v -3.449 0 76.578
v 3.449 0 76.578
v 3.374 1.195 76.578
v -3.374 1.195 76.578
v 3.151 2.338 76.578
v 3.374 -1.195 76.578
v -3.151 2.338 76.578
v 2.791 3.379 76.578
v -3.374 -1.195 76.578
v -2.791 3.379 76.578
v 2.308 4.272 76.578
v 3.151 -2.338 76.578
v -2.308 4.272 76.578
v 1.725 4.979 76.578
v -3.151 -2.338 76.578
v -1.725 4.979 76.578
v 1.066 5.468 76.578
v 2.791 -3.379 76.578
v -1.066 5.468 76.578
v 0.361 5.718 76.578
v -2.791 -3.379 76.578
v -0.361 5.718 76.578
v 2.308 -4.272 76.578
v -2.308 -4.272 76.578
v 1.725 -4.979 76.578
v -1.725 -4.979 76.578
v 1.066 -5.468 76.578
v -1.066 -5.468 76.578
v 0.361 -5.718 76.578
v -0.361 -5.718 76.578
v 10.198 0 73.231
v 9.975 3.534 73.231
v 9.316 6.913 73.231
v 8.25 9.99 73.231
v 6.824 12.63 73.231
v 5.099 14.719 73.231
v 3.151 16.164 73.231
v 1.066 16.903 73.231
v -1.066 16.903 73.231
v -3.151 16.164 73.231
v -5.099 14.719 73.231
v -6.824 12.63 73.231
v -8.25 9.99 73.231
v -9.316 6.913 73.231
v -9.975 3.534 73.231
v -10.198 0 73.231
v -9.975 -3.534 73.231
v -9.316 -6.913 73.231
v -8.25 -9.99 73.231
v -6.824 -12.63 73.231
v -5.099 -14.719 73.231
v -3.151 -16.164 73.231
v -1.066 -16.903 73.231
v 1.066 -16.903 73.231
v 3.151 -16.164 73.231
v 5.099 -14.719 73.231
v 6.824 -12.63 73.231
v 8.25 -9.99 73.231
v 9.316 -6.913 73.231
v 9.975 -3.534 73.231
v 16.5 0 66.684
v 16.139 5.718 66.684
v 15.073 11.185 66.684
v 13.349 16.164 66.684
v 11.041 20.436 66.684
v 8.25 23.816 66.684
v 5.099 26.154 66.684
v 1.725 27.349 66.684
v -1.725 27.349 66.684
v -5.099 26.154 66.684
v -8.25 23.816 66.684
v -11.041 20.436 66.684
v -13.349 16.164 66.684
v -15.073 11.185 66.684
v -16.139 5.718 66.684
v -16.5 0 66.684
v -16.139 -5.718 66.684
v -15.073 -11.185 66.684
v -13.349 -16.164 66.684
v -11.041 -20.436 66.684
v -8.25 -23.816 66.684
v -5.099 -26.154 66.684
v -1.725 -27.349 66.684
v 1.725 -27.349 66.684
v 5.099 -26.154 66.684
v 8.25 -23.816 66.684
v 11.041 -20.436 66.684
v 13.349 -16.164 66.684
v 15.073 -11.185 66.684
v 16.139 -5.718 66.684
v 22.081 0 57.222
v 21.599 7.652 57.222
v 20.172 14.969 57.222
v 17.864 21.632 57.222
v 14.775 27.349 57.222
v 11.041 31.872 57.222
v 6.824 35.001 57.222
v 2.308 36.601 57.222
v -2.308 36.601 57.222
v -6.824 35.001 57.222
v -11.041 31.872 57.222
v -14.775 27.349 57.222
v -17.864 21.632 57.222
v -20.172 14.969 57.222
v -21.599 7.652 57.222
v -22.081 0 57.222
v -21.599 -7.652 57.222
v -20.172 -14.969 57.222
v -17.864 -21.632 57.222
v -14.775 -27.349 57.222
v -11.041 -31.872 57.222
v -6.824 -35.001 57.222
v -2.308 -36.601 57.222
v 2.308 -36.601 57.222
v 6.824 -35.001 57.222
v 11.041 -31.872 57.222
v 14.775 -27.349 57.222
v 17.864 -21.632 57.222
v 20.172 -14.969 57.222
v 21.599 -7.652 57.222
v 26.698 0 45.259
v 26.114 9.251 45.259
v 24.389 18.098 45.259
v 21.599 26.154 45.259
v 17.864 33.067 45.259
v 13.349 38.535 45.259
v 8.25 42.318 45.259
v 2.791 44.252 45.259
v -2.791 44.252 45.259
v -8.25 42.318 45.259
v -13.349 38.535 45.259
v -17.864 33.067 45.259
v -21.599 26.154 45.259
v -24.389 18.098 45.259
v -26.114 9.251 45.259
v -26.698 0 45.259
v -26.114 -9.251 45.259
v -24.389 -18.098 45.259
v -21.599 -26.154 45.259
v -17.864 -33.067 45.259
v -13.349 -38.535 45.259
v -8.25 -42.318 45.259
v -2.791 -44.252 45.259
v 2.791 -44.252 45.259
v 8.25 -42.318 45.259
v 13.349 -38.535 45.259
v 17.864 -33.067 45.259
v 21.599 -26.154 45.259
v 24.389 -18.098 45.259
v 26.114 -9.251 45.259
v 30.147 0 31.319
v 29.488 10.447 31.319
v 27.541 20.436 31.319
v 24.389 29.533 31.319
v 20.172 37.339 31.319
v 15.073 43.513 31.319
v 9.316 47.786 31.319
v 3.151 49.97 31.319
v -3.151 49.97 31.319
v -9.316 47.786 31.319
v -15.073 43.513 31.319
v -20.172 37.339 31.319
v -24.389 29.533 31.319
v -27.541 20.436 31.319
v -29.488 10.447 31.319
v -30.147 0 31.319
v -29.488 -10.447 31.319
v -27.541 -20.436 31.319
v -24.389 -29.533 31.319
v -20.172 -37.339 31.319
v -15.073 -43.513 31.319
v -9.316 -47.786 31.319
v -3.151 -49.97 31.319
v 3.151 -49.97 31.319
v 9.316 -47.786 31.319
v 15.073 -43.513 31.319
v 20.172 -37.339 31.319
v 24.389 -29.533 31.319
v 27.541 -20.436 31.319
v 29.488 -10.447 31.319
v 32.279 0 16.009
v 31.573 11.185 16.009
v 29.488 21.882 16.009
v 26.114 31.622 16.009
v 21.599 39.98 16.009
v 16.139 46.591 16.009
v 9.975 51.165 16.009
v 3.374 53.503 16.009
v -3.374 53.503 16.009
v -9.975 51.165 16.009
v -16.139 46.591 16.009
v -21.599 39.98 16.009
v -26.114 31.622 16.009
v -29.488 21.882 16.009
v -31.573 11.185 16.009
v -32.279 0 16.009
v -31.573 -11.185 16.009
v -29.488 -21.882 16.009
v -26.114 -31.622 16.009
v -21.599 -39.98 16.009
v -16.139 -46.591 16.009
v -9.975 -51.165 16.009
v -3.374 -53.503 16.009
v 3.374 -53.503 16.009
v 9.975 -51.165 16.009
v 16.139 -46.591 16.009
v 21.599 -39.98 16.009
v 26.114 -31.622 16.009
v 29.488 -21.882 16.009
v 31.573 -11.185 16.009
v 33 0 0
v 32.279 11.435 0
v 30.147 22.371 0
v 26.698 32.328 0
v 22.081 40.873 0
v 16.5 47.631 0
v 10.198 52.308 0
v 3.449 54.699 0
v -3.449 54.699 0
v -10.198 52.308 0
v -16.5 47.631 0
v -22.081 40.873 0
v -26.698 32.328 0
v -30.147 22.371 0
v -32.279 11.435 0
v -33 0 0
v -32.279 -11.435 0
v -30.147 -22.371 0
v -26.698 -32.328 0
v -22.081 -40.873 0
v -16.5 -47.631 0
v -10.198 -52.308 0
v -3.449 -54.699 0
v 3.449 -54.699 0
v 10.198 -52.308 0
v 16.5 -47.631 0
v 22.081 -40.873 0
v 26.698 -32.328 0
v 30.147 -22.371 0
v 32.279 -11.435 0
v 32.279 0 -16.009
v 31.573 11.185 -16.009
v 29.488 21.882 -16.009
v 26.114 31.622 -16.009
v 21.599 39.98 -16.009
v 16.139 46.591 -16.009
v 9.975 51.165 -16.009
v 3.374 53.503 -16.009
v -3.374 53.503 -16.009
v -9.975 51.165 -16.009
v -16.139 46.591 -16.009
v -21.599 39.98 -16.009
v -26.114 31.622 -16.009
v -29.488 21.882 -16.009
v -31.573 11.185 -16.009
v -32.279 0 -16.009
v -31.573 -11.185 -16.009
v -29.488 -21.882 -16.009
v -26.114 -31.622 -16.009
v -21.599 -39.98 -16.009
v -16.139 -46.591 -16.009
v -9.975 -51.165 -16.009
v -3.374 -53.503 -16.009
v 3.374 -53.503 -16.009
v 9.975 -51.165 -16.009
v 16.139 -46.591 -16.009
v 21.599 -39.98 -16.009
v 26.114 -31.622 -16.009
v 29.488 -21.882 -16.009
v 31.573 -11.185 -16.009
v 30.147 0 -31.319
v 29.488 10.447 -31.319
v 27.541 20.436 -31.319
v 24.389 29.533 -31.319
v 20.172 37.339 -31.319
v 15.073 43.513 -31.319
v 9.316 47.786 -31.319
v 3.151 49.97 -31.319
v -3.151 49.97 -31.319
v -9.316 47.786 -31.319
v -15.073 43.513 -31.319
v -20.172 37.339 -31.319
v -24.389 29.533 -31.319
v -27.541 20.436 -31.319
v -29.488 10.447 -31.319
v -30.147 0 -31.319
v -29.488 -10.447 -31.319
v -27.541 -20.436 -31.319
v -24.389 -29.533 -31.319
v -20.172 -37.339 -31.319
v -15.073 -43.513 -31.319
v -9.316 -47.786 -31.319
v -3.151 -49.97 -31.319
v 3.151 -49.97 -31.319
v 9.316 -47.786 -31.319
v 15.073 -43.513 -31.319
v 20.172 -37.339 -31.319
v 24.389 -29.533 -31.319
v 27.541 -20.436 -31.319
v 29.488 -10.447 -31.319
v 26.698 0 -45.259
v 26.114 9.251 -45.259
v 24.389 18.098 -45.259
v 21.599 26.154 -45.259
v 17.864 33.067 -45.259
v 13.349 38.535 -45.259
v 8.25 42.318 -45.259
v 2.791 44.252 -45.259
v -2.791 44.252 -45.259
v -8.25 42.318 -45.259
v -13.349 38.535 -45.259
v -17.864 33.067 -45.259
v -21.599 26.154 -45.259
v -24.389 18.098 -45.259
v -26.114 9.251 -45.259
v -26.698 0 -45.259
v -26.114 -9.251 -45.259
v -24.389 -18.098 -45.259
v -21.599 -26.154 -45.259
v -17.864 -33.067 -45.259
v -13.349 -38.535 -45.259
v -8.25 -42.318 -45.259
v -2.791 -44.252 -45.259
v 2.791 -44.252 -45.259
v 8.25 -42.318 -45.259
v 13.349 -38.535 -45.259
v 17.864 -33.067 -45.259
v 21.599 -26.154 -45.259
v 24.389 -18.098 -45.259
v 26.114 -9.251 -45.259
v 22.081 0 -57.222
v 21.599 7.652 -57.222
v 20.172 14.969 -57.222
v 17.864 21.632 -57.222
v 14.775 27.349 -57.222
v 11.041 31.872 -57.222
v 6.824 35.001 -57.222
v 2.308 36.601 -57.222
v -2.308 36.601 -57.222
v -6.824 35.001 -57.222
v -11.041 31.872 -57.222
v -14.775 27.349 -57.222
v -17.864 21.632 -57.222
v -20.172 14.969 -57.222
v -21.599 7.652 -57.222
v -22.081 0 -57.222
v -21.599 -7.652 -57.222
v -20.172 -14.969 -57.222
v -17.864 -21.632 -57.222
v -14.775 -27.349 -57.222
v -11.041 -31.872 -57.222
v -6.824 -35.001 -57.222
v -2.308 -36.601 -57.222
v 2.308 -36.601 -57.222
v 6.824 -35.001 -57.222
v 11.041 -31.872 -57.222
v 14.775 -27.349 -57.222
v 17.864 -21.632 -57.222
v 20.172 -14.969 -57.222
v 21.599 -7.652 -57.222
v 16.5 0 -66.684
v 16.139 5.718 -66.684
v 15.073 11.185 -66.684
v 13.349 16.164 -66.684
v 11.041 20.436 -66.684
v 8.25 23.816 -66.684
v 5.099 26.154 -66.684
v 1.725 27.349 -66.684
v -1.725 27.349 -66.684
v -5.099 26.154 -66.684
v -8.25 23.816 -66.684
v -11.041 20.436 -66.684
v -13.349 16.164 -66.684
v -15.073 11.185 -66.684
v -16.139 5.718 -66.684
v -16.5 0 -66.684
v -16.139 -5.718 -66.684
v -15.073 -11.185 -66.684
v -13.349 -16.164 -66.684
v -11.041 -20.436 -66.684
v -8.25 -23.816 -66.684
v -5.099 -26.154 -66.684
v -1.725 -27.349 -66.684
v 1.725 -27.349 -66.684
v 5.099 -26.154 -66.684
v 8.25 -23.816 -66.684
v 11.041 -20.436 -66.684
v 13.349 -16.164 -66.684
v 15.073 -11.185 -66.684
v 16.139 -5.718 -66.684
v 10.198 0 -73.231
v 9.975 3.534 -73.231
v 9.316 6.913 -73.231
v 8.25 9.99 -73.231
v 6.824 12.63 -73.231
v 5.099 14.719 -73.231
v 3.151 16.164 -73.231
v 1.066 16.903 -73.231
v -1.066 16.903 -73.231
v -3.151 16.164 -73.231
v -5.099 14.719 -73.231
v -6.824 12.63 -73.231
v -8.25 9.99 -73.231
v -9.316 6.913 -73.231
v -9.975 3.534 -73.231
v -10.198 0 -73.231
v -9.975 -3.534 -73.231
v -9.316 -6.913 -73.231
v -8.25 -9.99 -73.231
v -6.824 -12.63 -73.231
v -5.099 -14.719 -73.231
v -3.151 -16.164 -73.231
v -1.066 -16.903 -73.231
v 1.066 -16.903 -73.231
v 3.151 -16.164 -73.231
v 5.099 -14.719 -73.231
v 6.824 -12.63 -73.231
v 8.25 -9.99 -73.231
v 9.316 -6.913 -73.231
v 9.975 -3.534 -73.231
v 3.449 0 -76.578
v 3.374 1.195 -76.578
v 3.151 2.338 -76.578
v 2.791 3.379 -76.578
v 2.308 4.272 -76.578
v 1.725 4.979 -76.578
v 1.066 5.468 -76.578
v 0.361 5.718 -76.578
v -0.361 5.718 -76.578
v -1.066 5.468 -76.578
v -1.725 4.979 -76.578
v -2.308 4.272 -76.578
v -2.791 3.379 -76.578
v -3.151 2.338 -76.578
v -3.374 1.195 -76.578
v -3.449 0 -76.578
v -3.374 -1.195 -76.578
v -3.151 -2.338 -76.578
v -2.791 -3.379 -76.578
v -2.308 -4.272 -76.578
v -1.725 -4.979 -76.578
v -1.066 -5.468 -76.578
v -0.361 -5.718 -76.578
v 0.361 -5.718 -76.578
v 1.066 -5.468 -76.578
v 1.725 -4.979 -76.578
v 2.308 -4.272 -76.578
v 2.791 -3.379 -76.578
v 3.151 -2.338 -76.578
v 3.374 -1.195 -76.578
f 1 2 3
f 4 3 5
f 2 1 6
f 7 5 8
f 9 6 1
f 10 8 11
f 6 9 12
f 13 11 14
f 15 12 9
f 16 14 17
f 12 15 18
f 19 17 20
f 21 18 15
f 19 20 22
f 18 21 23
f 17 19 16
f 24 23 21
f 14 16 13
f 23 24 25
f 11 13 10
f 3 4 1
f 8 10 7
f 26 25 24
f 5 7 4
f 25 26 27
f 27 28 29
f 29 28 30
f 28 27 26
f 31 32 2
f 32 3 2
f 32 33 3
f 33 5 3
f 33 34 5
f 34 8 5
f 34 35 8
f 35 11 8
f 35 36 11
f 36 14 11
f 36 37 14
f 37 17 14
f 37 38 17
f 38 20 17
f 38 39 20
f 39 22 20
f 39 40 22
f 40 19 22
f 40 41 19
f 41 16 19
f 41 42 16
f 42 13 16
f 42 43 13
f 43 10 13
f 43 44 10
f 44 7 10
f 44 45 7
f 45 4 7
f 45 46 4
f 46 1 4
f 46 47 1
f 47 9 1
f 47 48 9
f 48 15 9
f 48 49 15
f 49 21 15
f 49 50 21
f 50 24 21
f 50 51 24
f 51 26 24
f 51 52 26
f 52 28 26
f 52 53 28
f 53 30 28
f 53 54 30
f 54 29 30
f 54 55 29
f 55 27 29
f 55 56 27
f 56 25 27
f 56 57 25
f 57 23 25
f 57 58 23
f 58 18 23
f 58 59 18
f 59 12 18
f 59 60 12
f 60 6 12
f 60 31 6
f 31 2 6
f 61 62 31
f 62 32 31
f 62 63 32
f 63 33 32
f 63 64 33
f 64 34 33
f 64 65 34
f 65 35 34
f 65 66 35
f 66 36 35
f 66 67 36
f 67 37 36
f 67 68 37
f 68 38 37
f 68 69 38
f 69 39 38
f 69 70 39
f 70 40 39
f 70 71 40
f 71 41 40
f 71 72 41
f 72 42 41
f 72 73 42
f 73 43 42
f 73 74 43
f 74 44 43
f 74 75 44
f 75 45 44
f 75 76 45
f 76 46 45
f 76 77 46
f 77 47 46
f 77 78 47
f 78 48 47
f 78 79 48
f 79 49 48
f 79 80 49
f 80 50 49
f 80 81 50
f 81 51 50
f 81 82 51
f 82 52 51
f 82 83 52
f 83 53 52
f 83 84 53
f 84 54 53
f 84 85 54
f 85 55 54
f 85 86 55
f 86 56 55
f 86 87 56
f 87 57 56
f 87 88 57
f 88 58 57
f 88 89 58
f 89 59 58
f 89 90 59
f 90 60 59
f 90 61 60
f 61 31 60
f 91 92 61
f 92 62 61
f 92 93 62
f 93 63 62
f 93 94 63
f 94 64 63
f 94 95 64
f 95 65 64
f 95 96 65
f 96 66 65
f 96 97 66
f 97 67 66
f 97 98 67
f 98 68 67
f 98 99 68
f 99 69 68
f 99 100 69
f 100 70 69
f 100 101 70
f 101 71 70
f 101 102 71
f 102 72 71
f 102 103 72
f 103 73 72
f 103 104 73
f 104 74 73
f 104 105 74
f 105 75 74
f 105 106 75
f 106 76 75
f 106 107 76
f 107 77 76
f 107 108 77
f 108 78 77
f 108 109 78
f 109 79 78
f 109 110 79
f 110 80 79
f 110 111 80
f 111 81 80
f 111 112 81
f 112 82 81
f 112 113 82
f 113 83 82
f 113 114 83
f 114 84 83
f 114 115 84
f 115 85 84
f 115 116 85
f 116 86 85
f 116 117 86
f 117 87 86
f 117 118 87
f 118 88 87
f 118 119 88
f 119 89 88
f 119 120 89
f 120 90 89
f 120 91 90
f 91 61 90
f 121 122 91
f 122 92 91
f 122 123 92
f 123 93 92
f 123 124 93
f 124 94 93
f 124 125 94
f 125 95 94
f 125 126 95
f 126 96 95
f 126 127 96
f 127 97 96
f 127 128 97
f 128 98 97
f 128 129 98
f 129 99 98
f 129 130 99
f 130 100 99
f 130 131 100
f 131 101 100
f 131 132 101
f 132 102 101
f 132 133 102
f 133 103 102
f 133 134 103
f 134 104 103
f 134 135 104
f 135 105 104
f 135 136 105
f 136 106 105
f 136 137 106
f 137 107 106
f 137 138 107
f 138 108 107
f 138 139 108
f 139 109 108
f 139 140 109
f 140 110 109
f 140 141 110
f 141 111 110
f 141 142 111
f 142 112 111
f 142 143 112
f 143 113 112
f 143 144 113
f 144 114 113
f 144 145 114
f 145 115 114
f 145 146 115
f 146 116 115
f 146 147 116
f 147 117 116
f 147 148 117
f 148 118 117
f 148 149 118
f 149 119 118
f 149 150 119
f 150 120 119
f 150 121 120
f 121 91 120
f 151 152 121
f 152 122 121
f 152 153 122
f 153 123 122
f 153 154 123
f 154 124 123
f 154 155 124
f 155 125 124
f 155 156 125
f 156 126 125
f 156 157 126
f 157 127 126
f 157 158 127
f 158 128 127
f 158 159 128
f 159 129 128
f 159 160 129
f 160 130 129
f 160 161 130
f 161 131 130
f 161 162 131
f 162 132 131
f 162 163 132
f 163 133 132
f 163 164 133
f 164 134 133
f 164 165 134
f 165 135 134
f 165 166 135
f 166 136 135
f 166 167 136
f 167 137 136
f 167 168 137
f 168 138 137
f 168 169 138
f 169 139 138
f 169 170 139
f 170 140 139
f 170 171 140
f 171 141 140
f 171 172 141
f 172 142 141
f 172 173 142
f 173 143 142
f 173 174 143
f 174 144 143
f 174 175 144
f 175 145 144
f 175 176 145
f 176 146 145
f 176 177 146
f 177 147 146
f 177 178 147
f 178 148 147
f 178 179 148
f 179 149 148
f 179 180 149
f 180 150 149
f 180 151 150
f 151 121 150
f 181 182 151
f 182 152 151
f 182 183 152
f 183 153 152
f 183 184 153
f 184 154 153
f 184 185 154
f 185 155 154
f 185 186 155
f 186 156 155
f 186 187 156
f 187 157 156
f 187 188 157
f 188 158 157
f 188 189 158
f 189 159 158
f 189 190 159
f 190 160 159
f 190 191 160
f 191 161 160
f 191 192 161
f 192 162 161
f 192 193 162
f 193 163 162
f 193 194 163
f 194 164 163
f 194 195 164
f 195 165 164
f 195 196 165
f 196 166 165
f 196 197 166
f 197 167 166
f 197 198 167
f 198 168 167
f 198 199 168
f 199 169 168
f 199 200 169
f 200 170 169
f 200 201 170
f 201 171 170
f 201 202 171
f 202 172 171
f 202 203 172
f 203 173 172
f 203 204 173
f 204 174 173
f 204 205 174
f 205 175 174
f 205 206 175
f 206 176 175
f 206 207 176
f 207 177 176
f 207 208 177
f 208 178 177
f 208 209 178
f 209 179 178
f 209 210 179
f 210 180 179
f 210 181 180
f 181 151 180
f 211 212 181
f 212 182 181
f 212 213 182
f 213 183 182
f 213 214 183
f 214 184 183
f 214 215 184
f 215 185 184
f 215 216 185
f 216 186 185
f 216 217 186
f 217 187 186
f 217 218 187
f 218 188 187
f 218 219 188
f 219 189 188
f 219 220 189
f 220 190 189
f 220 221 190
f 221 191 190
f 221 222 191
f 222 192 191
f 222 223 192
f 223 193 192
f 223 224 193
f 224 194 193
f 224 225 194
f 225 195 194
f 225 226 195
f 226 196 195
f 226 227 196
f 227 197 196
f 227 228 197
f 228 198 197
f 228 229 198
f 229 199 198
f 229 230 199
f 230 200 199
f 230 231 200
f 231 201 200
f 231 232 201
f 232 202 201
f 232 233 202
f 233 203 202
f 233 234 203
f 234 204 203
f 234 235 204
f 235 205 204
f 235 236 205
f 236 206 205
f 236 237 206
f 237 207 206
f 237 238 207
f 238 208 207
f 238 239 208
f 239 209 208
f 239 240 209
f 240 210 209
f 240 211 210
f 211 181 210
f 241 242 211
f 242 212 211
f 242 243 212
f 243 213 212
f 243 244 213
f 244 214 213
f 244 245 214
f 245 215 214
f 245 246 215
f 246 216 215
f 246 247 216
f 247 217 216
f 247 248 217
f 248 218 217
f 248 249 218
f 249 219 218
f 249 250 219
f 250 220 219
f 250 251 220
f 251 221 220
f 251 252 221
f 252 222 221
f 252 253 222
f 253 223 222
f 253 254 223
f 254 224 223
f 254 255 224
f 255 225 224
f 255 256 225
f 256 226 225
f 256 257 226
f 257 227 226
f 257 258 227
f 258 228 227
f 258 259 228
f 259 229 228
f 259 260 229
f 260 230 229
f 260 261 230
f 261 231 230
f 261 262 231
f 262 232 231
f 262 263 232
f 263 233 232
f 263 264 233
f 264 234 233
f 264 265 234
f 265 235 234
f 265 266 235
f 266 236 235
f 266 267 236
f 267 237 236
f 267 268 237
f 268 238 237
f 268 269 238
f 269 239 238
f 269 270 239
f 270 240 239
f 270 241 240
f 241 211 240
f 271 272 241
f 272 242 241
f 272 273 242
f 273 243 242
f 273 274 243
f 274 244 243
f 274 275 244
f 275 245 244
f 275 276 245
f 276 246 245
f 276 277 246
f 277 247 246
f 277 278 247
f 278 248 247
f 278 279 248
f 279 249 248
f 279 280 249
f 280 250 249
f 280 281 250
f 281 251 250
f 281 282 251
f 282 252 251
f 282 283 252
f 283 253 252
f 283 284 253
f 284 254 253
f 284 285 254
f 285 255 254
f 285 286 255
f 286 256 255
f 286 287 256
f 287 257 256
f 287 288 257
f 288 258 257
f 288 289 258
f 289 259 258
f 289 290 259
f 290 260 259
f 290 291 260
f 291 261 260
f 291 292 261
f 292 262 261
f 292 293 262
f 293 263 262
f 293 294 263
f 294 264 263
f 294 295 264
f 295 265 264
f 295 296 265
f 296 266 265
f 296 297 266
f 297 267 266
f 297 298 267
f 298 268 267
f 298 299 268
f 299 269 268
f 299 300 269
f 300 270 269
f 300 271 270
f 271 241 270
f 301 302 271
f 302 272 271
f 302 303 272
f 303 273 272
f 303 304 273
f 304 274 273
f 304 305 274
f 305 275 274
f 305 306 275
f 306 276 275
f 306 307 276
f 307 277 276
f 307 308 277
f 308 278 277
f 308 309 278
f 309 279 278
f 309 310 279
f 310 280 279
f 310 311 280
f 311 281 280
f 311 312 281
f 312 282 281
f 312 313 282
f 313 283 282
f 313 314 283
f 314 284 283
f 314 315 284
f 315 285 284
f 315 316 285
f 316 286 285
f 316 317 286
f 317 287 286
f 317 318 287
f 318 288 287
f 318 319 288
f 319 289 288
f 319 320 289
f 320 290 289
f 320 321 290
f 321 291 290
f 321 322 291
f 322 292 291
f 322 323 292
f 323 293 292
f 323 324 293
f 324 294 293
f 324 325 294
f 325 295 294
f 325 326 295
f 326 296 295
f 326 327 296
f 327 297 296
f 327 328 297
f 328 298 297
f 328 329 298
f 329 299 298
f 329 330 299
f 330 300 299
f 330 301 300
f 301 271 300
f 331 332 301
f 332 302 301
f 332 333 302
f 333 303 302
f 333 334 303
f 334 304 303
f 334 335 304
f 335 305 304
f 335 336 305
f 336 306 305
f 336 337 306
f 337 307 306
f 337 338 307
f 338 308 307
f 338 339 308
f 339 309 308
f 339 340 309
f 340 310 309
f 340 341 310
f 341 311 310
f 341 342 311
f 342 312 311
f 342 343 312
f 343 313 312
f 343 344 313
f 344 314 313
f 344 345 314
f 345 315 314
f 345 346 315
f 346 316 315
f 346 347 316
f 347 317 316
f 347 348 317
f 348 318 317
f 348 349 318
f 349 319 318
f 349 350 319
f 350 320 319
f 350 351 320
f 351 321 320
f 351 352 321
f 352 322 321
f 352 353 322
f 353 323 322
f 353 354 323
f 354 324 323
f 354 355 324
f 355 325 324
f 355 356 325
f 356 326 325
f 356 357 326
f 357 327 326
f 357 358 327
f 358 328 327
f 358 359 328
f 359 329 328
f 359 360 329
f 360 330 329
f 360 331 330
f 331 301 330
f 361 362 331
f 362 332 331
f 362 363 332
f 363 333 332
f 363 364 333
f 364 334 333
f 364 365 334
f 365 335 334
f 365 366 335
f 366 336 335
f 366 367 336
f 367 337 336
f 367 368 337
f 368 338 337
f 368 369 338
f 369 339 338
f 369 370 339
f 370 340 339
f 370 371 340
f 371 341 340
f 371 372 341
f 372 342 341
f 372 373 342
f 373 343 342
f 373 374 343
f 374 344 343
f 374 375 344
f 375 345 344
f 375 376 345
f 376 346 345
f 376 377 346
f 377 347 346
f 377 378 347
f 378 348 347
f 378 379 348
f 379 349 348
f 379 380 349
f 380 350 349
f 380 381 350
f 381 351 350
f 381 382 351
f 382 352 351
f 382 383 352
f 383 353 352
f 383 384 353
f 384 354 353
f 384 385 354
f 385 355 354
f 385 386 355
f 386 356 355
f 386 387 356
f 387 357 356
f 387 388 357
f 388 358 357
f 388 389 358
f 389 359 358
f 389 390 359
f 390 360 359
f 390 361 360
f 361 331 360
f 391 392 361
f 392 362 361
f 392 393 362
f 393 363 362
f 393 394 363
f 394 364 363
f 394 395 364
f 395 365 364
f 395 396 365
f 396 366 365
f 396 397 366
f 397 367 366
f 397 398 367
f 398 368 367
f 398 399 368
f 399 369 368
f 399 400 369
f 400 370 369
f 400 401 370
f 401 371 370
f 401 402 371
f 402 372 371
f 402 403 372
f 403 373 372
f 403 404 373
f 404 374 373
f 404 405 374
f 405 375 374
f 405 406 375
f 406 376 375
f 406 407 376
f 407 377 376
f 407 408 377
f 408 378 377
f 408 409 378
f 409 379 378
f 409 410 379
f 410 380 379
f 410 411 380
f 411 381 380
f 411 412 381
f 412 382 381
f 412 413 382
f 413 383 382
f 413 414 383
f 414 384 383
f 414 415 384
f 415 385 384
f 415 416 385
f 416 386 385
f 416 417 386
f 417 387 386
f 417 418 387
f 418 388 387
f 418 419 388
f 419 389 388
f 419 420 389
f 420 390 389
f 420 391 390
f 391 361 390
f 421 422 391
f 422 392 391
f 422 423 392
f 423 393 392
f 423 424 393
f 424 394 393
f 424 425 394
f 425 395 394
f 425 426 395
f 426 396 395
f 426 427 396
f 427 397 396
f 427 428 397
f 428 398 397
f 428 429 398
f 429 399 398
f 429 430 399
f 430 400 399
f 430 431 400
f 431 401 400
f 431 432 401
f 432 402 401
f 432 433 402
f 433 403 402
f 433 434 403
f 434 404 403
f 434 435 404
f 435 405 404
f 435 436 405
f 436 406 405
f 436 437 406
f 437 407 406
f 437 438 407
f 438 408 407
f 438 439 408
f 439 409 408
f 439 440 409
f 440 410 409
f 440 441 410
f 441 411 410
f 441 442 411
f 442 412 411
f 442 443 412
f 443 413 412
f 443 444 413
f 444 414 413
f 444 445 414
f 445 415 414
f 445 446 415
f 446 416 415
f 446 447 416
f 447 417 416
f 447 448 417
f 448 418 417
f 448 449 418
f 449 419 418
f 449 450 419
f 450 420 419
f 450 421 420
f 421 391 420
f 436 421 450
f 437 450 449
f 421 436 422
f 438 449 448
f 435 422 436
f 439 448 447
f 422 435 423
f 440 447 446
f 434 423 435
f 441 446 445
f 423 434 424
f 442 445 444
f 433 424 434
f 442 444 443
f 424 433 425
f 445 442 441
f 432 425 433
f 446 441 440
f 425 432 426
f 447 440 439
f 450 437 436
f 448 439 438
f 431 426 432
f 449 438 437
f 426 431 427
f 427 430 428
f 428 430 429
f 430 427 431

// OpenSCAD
// Generated by SolidPython 1.0.1 on 2020-07-29 00:39:25


scale(v = [3, 5, 7]) {
	sphere(r = 11);
}
/***********************************************
*********      SolidPython code:      **********
************************************************
 
# import packages: SolidPython
from solid import *
from solid.utils import *
from itertools import chain, combinations


class Resize:

    def __init__(self, scad_file):
        self.scad_file = scad_file
        #self.scad_file = import_scad(scad_file)
        # cone/cylinder param:
        self.r1 = 0
        self.r2 = 0
        self.h = 0
        # rectangular prism param:
        self.w = 0
        self.l = 0
        # ellipse param:
        self.r = 0

    # import OpenScad code (file name corresponds to shape)


    # classify shape + parameters
    def assign(self, param1, param2, param3):
        if self.scad_file == 'cone.scad':
            self.r1 = param1
            self.r2 = param2
            self.h = param3
        elif self.scad_file == 'cylinder.scad':
            self.r1 = param1
            self.r2 = param2
            self.h = param3
        elif self.scad_file == 'rectangularPrism.scad':
            self.h = param1
            self.l = param2
            self.w = param3
        else:
            self.r = param1
            self.h = param2

    # resize parameters
    def iterate(self):
        x = range(3, 20, 2)
        i = 1
        if self.scad_file == 'cone.scad':
            tempList = list(combinations(x, 2))
            for temp in tempList:
                param1 = temp[0]
                param2 = temp[1]
                filepath = 'produced_scad_files/' + 'cone' + str(param1) + '_' + str(param2) + '_' + '.scad'
                scad_render_to_file(cylinder(h=param1, r1=param2, r2=0), filepath)

        elif self.scad_file == 'cylinder.scad':
            tempList = list(combinations(x, 3))
            for temp in tempList:
                param1 = temp[0]
                param2 = temp[1]
                filepath = 'produced_scad_files/' + 'cylinder' + str(param1) + '_' + str(param2) + '_' + '.scad'
                scad_render_to_file(cylinder(h=param1, r1=param2, r2=param2), filepath)

        elif self.scad_file == 'rectangularPrism.scad':
            tempList = list(combinations(x, 3))
            for temp in tempList:
                param1 = temp[0]
                param2 = temp[1]
                param3 = temp[2]
                filepath = 'produced_scad_files/' + 'rectangularPrism' + str(param1) + '_' + str(param2) + '_' + str(
                    param3) + '.scad'
                scad_render_to_file(cube(size=(param1, param2, param3)), filepath)

        elif self.scad_file == 'ellipse.scad':
            tempList = list(combinations(x, 4))
            for temp in tempList:
                param1 = temp[0]
                param2 = temp[1]
                param3 = temp[2]
                param4 = temp[3]
                filepath = 'produced_scad_files/' + 'ellipse' + str(param1) + '_' + str(param2) + '_' + str(param3) + '_' + str(param4) + '.scad'
                scad_render_to_file(scale([param1, param2, param3])(sphere(r=param4)), filepath)

    def render_to_scadfile(self):
        scad_render_to_file(scad, 'example.scad') 
 
************************************************/
